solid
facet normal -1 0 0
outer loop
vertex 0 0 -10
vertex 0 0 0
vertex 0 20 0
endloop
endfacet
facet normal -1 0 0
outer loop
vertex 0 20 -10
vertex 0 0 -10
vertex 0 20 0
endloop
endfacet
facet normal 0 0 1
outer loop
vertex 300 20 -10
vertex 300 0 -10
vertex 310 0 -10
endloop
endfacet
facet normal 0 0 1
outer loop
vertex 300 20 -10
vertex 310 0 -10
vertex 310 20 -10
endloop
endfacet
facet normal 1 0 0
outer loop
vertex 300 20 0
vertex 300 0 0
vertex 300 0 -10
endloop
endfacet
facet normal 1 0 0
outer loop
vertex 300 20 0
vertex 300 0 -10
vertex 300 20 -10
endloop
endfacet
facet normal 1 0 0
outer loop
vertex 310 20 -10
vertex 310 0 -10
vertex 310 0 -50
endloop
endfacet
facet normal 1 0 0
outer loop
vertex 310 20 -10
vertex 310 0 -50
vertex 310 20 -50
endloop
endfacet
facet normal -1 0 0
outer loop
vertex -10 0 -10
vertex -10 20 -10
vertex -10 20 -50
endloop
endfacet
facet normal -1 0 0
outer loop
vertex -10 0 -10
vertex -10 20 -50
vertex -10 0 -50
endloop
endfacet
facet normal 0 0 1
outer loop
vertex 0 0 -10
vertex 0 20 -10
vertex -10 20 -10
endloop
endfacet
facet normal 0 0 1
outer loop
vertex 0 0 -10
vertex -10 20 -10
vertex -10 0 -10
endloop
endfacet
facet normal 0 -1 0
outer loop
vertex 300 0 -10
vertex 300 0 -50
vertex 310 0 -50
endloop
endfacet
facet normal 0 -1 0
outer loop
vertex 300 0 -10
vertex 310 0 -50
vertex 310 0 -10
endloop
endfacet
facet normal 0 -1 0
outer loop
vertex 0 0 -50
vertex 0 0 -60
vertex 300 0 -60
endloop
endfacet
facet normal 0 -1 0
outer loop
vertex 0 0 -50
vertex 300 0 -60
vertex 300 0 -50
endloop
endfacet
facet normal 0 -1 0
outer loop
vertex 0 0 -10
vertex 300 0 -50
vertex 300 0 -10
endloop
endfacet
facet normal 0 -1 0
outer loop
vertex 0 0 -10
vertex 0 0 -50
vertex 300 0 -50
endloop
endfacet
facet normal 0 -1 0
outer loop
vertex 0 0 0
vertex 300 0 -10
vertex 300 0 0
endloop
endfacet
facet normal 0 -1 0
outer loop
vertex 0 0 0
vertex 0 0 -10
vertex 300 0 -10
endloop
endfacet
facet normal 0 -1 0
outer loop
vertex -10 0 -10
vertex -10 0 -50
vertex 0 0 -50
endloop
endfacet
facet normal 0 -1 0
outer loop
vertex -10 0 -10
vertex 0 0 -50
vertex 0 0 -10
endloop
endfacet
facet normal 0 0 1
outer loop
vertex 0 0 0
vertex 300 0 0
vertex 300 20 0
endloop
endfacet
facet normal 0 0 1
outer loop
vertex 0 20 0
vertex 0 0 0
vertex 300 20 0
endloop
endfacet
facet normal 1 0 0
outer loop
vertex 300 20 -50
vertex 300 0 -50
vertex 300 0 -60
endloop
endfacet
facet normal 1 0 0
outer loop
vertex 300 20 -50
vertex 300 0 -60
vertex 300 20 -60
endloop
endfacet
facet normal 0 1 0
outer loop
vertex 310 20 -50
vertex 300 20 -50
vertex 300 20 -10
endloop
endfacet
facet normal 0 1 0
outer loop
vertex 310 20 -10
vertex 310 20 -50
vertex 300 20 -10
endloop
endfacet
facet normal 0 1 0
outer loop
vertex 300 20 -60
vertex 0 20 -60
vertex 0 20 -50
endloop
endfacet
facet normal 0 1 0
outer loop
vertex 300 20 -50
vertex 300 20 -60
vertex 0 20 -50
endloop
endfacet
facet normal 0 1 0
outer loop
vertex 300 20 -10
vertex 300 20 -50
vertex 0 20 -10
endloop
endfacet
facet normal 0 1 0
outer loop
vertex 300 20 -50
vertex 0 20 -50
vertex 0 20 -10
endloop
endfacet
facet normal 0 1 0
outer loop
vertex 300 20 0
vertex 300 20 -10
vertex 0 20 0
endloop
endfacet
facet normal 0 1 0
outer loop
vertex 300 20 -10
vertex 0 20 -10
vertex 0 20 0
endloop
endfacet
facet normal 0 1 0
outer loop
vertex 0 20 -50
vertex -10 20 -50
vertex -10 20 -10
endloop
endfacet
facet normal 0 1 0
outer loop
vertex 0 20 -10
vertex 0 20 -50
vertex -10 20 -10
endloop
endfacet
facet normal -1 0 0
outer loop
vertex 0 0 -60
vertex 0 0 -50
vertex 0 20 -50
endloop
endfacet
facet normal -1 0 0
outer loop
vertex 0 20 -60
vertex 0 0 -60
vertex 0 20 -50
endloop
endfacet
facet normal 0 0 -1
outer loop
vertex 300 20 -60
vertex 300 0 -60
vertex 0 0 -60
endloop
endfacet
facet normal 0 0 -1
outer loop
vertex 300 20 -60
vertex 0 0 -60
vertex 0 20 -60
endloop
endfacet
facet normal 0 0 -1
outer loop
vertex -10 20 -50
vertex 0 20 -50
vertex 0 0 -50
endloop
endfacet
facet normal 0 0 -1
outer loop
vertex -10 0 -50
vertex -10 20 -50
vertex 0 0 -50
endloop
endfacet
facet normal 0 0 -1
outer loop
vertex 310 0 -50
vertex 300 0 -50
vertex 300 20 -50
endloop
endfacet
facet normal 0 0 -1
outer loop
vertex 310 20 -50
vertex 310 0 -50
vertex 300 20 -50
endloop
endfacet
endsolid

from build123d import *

# Parameters (mm, degrees)
F0_W     = 20
F0_H     = 60
F1_DEPTH = 300
F2_W     = 20
F2_H     = 40
F3_DEPTH = 10
F4_W     = 20
F4_H     = 40
F5_DEPTH = 10


with BuildPart() as f1:
    # F0 (on Right) → F1 (new body)
    with BuildSketch(Plane.YZ):
        with Locations((10, -30)):
            Rectangle(F0_W, F0_H)
    extrude(amount=F1_DEPTH)

    # F2 (on face) → F3 (join)
    with BuildSketch(Plane(origin=(0, 0, 0), x_dir=(0, -1, 0), z_dir=(-1, 0, 0))):
        with Locations((-10, -30)):
            Rectangle(F2_W, F2_H)
    extrude(amount=F3_DEPTH)

    # F4 (on face) → F5 (join)
    with BuildSketch(Plane.YZ.offset(300)):
        with Locations((10, -30)):
            Rectangle(F4_W, F4_H)
    extrude(amount=F5_DEPTH)


solid = f1.part
